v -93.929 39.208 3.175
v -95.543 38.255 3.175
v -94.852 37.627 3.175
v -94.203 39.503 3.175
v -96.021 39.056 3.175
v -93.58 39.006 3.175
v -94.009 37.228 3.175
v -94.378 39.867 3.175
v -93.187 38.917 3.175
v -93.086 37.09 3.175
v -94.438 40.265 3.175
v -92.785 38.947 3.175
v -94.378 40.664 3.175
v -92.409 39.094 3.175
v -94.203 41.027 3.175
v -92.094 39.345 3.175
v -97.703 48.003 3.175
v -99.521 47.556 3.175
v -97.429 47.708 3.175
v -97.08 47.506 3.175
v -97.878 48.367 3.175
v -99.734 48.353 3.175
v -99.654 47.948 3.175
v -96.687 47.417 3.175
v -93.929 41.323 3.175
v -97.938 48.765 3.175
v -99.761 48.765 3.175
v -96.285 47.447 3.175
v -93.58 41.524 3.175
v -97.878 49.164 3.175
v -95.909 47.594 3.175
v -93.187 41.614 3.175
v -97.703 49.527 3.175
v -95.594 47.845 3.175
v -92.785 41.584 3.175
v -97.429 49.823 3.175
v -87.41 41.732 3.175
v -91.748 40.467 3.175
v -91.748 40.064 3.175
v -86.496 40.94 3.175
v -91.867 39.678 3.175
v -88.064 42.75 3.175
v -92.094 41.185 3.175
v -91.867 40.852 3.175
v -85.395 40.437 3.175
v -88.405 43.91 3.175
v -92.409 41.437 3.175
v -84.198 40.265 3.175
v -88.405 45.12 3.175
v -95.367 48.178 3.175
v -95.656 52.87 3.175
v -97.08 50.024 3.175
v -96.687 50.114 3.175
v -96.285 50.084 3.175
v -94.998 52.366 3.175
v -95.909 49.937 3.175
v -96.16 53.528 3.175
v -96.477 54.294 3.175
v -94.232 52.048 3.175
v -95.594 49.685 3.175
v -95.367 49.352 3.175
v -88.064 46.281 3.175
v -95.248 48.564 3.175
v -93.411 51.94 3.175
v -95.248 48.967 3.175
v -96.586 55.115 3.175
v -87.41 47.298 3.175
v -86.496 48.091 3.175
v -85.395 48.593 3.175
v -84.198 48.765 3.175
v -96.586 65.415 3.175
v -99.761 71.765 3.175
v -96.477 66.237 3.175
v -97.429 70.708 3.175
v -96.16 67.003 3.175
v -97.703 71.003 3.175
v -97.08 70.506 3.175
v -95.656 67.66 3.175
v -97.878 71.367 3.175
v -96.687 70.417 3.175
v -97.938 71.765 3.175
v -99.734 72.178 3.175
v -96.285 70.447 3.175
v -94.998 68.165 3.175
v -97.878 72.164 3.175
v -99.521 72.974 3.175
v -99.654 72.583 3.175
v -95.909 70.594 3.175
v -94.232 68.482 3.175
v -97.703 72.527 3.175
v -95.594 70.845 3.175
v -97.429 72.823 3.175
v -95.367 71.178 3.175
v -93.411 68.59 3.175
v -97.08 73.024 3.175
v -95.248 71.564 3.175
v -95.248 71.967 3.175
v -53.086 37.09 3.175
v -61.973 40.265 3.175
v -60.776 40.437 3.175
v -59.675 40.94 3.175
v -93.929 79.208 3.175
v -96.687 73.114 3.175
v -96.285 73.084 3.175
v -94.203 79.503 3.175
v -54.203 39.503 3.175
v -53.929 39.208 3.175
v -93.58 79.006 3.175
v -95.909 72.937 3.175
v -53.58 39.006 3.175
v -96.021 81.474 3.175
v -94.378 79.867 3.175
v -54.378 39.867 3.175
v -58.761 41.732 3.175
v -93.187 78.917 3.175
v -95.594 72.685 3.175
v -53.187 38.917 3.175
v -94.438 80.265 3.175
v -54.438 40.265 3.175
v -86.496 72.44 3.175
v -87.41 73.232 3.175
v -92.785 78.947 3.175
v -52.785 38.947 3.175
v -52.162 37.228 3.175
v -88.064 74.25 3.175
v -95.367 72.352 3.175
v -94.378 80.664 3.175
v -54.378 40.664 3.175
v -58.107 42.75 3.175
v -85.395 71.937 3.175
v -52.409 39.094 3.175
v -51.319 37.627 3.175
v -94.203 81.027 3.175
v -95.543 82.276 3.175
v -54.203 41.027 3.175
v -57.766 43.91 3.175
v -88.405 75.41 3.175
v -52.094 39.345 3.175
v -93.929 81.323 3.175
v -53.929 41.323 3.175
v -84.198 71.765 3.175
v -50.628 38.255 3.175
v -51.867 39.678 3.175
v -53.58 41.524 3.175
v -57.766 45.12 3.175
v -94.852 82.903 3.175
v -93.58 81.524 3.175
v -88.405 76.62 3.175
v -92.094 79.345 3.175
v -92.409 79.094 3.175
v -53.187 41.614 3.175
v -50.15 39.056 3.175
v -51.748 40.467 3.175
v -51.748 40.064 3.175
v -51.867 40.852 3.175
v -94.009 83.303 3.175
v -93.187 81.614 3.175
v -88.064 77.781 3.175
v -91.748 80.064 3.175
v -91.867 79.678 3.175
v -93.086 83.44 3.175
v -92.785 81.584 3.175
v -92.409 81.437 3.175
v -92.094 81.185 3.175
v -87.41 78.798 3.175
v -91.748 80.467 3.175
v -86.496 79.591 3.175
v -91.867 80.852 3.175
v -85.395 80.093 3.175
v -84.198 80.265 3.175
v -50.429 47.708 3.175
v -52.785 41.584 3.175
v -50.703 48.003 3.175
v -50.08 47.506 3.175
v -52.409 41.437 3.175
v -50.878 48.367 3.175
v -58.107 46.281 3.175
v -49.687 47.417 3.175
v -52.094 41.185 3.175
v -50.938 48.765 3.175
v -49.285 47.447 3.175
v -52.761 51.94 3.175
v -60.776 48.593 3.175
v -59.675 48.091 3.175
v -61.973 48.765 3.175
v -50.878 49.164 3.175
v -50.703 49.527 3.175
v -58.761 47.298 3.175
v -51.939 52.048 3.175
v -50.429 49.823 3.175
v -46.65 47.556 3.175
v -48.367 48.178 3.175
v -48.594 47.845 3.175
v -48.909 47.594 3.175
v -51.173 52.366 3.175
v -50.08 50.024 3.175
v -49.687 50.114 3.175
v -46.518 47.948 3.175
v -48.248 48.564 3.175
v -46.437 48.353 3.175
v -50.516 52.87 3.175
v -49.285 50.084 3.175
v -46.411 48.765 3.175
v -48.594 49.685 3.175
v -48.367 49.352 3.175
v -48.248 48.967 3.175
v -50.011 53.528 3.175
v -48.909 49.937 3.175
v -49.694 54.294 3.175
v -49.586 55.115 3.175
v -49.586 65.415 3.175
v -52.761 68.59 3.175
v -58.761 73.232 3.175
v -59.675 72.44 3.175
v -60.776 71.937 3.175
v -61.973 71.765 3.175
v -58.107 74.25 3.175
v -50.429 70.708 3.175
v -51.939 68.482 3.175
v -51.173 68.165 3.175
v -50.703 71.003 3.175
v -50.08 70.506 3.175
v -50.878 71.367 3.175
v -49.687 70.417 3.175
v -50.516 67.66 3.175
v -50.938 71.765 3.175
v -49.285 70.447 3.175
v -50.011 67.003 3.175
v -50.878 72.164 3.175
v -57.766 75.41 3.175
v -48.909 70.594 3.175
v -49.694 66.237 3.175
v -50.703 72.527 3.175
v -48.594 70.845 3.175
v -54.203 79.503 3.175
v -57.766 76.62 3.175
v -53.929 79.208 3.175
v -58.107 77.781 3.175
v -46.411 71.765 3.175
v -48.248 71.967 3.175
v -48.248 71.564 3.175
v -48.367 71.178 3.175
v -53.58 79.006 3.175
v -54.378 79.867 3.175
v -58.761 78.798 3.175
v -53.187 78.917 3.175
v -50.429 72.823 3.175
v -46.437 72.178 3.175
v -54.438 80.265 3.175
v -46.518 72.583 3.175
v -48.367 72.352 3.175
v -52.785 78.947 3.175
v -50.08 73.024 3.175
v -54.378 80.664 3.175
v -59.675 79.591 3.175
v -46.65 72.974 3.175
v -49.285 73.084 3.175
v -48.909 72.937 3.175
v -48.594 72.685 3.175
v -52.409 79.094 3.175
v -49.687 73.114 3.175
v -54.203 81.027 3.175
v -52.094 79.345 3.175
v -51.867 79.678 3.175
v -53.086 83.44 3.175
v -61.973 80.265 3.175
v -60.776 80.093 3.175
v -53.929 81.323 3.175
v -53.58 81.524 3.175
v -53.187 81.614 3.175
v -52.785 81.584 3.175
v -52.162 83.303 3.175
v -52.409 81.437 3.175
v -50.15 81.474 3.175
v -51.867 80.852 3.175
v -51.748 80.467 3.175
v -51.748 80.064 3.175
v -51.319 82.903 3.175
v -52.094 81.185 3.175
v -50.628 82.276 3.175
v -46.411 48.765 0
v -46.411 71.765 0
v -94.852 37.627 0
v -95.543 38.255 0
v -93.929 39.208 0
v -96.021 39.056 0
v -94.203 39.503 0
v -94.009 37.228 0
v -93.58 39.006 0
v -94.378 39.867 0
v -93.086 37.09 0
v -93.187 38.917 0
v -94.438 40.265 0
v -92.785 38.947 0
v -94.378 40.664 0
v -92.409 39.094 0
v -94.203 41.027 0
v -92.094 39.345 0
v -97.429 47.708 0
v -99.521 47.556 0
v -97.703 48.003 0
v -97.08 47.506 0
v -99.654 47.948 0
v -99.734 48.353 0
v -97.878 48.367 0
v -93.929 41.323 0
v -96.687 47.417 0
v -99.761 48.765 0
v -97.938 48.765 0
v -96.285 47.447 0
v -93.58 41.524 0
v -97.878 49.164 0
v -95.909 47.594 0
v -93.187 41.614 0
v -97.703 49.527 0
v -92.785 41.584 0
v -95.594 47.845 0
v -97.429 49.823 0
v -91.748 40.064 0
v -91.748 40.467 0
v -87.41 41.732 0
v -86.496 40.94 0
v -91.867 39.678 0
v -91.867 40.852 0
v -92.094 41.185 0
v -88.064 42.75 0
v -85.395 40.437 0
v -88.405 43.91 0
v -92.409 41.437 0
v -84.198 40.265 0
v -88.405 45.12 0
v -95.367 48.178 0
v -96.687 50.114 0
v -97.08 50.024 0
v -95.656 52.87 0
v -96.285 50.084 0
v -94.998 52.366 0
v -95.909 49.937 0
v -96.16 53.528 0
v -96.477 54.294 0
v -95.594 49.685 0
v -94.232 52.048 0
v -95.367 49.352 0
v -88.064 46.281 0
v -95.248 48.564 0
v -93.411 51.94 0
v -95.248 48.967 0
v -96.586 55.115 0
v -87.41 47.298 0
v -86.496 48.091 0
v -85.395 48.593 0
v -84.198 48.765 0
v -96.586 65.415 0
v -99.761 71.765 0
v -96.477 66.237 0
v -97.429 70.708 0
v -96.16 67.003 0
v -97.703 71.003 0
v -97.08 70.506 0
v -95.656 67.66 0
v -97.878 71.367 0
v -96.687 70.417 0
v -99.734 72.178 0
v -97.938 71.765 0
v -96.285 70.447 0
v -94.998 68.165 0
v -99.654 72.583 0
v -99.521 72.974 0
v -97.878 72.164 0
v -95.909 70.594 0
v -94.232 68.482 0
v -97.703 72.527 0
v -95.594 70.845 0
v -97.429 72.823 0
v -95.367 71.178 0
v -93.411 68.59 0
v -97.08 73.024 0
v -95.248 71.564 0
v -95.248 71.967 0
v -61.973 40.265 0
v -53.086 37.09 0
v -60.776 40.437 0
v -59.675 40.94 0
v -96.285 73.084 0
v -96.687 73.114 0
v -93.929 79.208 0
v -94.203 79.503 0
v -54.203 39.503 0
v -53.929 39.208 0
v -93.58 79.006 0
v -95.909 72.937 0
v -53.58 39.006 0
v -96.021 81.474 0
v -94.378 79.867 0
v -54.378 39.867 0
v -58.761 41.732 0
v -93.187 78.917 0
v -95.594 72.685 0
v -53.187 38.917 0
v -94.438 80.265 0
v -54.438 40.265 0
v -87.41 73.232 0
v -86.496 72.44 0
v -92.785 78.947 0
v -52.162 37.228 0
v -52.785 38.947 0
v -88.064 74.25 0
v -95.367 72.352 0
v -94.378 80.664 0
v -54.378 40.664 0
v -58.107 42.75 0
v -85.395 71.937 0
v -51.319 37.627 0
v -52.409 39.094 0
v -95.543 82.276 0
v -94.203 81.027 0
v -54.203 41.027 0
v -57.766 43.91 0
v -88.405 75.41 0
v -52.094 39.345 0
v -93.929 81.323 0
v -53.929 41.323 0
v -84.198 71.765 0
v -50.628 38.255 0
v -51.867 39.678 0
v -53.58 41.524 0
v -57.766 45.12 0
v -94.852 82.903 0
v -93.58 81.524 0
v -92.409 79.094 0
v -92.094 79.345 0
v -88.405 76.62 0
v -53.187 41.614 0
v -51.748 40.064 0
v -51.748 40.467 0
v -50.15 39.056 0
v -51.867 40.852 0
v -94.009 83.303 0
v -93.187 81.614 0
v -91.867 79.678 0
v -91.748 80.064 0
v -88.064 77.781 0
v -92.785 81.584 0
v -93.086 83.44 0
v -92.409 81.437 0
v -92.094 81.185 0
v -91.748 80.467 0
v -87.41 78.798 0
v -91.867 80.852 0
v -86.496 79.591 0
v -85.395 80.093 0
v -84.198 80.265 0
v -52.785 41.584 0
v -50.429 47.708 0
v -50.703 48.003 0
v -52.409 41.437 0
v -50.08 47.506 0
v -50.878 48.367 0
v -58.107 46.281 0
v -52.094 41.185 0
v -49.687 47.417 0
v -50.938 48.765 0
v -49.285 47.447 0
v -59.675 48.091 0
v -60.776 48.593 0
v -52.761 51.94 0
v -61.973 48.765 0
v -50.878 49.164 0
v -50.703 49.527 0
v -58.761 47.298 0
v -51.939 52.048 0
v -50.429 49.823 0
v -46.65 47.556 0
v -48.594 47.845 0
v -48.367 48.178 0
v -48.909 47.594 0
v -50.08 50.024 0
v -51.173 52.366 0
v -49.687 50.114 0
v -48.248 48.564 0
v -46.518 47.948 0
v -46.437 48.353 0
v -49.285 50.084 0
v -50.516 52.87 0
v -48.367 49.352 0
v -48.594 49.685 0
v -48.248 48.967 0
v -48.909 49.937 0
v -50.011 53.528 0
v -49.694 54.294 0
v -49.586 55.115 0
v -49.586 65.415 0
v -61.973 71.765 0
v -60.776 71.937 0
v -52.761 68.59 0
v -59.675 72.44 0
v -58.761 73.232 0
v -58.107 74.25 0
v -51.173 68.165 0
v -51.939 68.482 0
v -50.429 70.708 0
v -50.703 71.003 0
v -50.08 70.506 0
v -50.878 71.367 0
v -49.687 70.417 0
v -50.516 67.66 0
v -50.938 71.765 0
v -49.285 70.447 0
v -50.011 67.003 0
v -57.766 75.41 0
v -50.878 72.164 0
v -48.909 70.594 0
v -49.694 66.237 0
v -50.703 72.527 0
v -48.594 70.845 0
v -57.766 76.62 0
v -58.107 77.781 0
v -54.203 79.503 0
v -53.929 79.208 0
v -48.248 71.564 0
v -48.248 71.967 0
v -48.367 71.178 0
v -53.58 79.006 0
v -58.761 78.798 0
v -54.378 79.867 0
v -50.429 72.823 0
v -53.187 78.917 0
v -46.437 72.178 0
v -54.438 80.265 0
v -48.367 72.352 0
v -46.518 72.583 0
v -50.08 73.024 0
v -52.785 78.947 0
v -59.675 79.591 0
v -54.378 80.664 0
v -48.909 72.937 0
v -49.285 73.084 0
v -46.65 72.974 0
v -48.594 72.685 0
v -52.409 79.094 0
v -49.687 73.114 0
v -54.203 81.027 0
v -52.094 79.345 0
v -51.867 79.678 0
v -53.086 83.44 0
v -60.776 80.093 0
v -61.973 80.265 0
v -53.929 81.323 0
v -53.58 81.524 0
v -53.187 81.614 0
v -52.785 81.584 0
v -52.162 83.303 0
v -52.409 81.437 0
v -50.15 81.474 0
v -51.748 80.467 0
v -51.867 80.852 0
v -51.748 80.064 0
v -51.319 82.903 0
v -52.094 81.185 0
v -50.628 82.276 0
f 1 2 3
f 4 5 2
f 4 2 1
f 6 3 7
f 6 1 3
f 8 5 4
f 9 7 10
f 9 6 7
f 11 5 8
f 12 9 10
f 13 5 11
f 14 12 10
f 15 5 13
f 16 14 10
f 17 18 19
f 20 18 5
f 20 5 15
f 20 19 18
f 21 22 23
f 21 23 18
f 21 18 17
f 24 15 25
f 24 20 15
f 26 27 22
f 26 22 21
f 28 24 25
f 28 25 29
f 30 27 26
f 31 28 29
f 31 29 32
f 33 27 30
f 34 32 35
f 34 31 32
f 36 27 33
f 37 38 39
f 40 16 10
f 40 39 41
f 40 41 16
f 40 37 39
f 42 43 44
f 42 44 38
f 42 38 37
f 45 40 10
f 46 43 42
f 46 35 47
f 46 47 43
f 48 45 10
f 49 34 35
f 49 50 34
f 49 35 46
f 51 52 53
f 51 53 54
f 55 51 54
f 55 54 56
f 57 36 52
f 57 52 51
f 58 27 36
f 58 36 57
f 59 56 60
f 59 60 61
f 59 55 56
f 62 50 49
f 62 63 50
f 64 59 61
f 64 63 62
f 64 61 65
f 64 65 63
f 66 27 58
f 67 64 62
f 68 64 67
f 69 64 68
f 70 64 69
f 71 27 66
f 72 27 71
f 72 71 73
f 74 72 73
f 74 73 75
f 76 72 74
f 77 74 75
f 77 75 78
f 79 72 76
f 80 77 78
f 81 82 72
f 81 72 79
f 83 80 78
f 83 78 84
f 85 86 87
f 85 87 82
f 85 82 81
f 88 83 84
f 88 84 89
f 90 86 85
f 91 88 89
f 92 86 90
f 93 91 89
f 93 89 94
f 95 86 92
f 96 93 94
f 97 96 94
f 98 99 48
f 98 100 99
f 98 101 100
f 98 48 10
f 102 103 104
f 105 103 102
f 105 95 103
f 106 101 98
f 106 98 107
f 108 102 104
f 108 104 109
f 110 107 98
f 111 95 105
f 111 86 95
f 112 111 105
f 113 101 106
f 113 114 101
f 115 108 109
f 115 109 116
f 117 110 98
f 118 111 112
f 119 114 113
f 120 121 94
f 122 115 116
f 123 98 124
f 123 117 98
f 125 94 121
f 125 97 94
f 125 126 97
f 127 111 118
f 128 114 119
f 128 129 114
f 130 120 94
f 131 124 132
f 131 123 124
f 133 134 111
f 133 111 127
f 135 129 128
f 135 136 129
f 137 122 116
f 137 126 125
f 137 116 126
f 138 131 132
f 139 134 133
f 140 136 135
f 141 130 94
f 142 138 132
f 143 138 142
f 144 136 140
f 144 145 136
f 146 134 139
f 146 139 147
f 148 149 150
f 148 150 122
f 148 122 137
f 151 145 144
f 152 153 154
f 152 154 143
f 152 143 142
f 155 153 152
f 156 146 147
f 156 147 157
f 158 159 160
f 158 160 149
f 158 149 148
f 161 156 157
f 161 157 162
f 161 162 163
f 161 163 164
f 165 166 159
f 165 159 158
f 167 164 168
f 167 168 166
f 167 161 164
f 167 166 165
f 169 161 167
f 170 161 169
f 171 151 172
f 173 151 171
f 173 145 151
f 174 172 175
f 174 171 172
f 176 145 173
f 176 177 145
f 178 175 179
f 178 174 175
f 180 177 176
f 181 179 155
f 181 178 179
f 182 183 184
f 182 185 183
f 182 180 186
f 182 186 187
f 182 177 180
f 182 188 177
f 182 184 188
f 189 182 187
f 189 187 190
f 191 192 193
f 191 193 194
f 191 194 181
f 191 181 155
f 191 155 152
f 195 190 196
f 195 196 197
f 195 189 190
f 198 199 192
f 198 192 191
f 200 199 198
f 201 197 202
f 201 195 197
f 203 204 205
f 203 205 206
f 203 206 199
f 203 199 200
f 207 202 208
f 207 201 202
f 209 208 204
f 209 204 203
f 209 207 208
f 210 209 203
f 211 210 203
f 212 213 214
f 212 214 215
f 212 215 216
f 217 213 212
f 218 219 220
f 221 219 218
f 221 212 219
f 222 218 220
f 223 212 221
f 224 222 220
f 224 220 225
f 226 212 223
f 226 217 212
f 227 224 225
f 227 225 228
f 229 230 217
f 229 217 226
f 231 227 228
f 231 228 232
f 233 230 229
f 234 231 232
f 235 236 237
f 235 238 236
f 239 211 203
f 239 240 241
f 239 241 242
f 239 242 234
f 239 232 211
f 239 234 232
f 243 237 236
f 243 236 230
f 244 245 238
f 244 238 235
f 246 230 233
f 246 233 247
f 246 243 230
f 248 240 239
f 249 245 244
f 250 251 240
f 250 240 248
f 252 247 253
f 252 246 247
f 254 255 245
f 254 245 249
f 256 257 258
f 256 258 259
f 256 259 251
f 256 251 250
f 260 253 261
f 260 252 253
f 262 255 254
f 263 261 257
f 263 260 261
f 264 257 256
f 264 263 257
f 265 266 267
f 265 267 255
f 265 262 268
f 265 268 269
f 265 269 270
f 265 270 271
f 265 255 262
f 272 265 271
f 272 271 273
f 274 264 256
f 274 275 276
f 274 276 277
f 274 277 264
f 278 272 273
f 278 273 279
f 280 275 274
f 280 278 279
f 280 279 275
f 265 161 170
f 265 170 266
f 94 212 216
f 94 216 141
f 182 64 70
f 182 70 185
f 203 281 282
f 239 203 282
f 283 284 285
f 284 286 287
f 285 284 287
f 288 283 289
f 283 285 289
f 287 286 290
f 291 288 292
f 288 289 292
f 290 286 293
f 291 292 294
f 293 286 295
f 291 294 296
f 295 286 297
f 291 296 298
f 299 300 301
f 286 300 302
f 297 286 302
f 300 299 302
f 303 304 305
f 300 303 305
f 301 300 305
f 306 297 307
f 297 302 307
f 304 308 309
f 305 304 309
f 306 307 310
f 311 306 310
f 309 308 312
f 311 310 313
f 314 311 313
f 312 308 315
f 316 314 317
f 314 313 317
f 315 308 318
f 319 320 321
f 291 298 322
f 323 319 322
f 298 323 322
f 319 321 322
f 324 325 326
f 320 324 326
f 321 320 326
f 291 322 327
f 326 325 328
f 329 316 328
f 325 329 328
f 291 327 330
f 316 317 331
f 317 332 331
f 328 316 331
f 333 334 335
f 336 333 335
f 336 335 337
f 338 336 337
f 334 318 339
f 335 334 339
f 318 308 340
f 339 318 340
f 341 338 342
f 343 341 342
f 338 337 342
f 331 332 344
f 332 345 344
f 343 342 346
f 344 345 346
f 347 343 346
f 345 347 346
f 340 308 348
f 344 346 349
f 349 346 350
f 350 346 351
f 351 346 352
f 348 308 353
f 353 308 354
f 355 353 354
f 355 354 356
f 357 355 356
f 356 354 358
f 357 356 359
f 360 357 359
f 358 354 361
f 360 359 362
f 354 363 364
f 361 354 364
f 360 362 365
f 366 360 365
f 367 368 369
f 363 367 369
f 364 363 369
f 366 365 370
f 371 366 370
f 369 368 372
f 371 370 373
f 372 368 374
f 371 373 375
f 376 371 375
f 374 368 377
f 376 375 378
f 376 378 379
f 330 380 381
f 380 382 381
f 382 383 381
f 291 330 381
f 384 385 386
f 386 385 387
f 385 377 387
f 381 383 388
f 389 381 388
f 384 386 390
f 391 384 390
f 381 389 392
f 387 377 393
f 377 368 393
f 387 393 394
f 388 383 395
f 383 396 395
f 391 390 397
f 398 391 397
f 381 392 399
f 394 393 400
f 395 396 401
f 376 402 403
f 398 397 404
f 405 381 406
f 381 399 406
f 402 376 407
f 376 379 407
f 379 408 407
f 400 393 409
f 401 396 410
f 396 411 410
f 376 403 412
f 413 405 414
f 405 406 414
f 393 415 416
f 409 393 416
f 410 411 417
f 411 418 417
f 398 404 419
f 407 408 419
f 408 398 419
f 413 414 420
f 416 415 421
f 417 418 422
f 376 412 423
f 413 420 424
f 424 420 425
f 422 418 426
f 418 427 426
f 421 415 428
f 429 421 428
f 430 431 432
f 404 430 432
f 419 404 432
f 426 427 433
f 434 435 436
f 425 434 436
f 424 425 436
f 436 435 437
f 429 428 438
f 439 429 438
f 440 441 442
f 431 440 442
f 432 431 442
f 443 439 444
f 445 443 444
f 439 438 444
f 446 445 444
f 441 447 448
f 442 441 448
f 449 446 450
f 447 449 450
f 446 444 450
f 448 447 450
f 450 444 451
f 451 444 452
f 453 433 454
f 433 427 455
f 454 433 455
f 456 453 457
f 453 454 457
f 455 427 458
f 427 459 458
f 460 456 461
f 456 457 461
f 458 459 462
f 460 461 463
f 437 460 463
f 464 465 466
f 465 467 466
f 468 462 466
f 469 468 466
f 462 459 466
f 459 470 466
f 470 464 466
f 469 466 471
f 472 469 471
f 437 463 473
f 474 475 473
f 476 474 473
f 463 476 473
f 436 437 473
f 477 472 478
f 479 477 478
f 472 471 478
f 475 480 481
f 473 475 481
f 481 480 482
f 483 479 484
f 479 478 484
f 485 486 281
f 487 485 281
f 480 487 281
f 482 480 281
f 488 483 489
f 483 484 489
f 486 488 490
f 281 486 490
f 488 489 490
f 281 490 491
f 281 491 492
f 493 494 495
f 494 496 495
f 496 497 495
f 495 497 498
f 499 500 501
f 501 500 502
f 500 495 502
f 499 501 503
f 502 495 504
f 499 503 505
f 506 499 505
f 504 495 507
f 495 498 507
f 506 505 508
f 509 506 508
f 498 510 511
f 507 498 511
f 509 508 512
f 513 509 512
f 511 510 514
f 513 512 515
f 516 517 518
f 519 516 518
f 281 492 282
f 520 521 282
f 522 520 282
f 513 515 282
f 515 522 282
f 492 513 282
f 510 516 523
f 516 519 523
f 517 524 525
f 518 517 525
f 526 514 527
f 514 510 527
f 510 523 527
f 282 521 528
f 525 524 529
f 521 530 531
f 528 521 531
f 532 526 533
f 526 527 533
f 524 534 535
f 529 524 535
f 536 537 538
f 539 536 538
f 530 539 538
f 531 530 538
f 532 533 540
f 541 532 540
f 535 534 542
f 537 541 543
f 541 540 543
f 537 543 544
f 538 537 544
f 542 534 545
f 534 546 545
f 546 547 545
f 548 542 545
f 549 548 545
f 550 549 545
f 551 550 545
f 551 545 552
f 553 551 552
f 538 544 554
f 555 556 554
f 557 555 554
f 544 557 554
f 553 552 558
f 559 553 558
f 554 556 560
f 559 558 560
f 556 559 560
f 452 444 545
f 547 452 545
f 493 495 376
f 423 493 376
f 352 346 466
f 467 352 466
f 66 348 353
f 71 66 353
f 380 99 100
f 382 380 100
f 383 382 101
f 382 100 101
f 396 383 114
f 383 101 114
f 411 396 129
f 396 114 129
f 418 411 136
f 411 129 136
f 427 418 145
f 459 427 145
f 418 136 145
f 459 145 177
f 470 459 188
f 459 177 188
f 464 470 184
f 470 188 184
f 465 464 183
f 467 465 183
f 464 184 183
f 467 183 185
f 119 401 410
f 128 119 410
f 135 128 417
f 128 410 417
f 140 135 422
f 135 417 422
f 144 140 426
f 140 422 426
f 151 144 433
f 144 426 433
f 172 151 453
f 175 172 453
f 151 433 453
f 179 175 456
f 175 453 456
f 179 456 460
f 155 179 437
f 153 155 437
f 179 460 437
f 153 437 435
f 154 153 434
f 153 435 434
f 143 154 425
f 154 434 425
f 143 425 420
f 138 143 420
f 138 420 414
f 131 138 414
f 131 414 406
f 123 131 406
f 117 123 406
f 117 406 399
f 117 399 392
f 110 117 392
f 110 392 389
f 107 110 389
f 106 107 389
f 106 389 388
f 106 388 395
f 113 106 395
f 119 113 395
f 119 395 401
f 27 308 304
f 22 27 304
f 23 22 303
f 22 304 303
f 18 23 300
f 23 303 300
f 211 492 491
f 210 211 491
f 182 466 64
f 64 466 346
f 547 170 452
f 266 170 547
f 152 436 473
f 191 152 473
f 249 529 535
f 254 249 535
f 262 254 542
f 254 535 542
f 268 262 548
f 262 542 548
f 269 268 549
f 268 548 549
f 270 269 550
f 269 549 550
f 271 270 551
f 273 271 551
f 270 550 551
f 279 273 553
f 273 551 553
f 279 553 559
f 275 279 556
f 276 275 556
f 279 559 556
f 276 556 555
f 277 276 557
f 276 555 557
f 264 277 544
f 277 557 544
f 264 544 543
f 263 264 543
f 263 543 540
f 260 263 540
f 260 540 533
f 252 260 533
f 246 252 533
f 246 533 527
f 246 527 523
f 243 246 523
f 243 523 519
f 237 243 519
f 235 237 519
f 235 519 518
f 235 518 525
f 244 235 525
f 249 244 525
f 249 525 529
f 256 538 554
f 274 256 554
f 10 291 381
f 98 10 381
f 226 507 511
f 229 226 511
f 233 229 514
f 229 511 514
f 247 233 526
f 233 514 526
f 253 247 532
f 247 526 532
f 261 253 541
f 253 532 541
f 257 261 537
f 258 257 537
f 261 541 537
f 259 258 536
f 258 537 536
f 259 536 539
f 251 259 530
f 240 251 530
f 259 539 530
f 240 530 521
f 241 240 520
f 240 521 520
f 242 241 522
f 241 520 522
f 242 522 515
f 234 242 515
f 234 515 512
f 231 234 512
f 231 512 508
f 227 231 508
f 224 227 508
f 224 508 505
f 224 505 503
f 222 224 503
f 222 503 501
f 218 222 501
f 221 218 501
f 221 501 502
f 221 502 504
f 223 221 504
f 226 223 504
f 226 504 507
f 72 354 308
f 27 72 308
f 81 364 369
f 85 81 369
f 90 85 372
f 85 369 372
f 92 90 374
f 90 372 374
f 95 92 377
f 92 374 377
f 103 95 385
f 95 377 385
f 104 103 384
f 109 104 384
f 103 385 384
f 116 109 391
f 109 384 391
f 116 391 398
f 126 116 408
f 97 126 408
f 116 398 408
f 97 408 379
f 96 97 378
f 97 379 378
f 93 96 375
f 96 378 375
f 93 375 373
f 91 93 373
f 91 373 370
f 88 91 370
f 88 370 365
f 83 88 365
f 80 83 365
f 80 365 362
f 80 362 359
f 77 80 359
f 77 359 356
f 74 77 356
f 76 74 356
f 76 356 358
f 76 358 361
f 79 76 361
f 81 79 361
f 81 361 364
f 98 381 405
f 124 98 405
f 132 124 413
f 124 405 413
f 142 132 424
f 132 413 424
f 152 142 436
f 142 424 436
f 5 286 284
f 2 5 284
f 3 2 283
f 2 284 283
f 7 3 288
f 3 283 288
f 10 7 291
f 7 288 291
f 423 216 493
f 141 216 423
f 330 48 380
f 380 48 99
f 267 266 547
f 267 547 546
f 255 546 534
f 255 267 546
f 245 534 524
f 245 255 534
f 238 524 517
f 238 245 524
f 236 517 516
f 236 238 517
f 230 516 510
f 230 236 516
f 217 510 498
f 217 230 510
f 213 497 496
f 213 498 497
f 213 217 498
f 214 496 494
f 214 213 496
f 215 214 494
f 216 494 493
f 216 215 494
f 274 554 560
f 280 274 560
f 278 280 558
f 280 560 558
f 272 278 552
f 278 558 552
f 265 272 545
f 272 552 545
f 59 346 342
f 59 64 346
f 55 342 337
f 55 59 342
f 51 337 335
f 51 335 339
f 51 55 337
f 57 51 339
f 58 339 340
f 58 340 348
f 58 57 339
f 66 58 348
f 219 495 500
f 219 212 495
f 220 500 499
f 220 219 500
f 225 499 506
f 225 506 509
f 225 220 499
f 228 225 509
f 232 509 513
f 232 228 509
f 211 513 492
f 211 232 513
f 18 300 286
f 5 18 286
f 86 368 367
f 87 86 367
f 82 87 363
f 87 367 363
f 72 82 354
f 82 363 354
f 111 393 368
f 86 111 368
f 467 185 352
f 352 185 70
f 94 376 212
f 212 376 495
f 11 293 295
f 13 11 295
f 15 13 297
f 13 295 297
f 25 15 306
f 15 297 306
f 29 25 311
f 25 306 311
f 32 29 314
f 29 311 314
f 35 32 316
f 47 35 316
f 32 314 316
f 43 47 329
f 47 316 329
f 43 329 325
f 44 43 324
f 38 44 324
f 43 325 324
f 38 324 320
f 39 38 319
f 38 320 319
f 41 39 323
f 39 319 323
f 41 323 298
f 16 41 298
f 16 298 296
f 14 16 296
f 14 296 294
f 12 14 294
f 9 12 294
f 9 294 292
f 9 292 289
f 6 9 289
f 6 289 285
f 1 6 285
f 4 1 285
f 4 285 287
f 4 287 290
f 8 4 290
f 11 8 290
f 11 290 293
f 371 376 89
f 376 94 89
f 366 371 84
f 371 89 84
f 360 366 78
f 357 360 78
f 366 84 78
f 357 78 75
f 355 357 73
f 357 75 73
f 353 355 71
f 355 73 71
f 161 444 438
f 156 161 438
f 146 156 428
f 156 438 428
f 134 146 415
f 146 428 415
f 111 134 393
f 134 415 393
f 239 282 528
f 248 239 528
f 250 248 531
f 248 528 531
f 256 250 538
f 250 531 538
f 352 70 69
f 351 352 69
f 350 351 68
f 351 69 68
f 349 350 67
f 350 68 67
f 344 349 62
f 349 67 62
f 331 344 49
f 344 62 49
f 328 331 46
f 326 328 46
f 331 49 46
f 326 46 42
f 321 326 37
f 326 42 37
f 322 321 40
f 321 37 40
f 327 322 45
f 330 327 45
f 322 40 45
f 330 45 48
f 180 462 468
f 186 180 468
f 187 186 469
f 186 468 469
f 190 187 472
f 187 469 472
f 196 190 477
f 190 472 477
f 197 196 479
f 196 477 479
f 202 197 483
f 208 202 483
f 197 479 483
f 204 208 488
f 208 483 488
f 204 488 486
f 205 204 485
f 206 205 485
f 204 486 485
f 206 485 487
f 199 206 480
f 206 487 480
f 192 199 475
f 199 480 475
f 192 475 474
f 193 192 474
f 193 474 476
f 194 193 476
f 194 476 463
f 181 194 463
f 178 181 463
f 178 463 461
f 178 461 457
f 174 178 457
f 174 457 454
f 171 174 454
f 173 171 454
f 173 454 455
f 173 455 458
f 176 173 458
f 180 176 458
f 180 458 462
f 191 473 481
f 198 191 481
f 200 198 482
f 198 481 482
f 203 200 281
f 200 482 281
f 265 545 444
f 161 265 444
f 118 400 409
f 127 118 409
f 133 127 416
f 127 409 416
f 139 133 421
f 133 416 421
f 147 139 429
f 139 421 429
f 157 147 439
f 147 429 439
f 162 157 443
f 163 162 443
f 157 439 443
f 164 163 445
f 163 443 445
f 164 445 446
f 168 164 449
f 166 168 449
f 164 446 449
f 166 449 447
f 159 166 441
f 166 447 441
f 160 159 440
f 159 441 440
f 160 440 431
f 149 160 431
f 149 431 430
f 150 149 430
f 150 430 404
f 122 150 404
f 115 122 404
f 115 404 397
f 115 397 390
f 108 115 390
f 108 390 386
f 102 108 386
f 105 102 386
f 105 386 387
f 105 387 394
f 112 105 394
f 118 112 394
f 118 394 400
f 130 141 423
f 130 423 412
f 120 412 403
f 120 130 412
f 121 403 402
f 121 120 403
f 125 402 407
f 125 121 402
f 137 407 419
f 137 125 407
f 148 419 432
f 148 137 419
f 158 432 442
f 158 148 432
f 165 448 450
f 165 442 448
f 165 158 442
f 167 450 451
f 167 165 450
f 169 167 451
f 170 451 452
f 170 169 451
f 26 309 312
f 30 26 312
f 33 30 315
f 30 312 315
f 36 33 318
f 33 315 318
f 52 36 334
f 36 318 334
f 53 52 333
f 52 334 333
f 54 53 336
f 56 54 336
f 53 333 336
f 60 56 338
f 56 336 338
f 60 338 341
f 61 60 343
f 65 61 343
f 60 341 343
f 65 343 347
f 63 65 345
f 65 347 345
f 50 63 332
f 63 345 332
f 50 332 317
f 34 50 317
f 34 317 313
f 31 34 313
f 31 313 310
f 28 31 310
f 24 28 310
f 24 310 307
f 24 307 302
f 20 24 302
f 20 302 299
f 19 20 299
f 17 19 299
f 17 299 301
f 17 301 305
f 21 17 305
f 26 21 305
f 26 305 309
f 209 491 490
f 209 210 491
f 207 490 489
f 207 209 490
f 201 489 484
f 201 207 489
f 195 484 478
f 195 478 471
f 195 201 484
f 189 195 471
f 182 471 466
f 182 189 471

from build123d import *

# Parameters (mm, degrees)
SKETCH1_R             = 3.175
BOSS_EXTRUDE1_DEPTH   = 3.175
FILLET1_R             = 3.175
F_2_CLEARANCE_HOLE1_D = 2.7051
F_2_CLEARANCE_HOLE2_D = 2.7051
CUT_EXTRUDE1_DEPTH    = 131.094336971


with BuildPart() as part:
    # Sketch1 → Boss-Extrude1 (new body)
    with BuildSketch(Plane.XY):
        with BuildLine():
            ThreePointArc((-89.910569383, 80.265306107), (-93.701723521, 77.150666629), (-96.021422346, 81.474186739))
            Line((-96.021422346, 81.474186739), (-99.521422346, 72.974186739))
            ThreePointArc((-99.521422346, 72.974186739), (-95.969415245, 74.879945585), (-93.410569383, 71.765306107))
            ThreePointArc((-93.410569383, 71.765306107), (-94.340505353, 69.520242077), (-96.585569383, 68.590306107))
            Line((-96.585569383, 68.590306107), (-49.585569383, 68.590306107))
            ThreePointArc((-49.585569383, 68.590306107), (-52.223638848, 73.532002034), (-46.649716421, 72.974186739))
            Line((-46.649716421, 72.974186739), (-50.149716421, 81.474186739))
            ThreePointArc((-50.149716421, 81.474186739), (-49.970929905, 80.881460245), (-49.910569383, 80.265306107))
            ThreePointArc((-49.910569383, 80.265306107), (-55.330633414, 78.020242077), (-53.085569383, 83.440306107))
            Line((-53.085569383, 83.440306107), (-93.085569383, 83.440306107))
            ThreePointArc((-93.085569383, 83.440306107), (-90.840505353, 82.510370138), (-89.910569383, 80.265306107))
        make_face()
        with Locations((-93.085569383, 80.265306107)):
            Circle(SKETCH1_R)
        with Locations((-96.585569383, 71.765306107)):
            Circle(SKETCH1_R)
        with Locations((-49.585569383, 71.765306107)):
            Circle(SKETCH1_R)
        with Locations((-53.085569383, 80.265306107)):
            Circle(SKETCH1_R)
        with BuildLine():
            ThreePointArc((-46.410569383, 71.765306107), (-47.340505353, 69.520242077), (-49.585569383, 68.590306107))
            Line((-49.585569383, 68.590306107), (-49.585569383, 51.940306107))
            ThreePointArc((-49.585569383, 51.940306107), (-47.340505353, 51.010370138), (-46.410569383, 48.765306107))
            Line((-46.410569383, 48.765306107), (-46.410569383, 71.765306107))
        make_face()
        with Locations((-49.585569383, 48.765306107)):
            Circle(SKETCH1_R)
        with Locations((-53.085569383, 40.265306107)):
            Circle(SKETCH1_R)
        with BuildLine():
            Line((-49.585569383, 51.940306107), (-96.585569383, 51.940306107))
            ThreePointArc((-96.585569383, 51.940306107), (-94.340505353, 51.010370138), (-93.410569383, 48.765306107))
            ThreePointArc((-93.410569383, 48.765306107), (-95.969415245, 45.650666629), (-99.521422346, 47.556425476))
            Line((-99.521422346, 47.556425476), (-96.021422346, 39.056425476))
            ThreePointArc((-96.021422346, 39.056425476), (-93.701723521, 43.379945585), (-89.910569383, 40.265306107))
            ThreePointArc((-89.910569383, 40.265306107), (-90.840505353, 38.020242077), (-93.085569383, 37.090306107))
            Line((-93.085569383, 37.090306107), (-53.085569383, 37.090306107))
            ThreePointArc((-53.085569383, 37.090306107), (-55.330633414, 42.510370138), (-49.910569383, 40.265306107))
            ThreePointArc((-49.910569383, 40.265306107), (-49.970929905, 39.649151969), (-50.149716421, 39.056425476))
            Line((-50.149716421, 39.056425476), (-46.649716421, 47.556425476))
            ThreePointArc((-46.649716421, 47.556425476), (-52.223638848, 46.998610181), (-49.585569383, 51.940306107))
        make_face()
        with Locations((-93.085569383, 40.265306107)):
            Circle(SKETCH1_R)
        with Locations((-96.585569383, 48.765306107)):
            Circle(SKETCH1_R)
        with BuildLine():
            ThreePointArc((-96.585569383, 68.590306107), (-98.830633414, 69.520242077), (-99.760569383, 71.765306107))
            Line((-99.760569383, 71.765306107), (-99.760569383, 48.765306107))
            ThreePointArc((-99.760569383, 48.765306107), (-98.830633414, 51.010370138), (-96.585569383, 51.940306107))
            Line((-96.585569383, 51.940306107), (-96.585569383, 68.590306107))
        make_face()
    extrude(amount=BOSS_EXTRUDE1_DEPTH)

    # Fillet1
    fillet1_edges = [part.edges().sort_by_distance(p)[0] for p in [
        (-96.585569383, 68.590306107, 1.5875),
        (-96.585569383, 51.940306107, 1.5875),
        (-49.585569383, 51.940306107, 1.5875),
        (-49.585569383, 68.590306107, 1.5875),
    ]]
    fillet(fillet1_edges, radius=FILLET1_R)

    # #2 Clearance Hole1 (through all)
    with Locations(Plane.XY.offset(3.175)):
        with Locations((-93.085569383, 80.265306107), (-53.085569383, 80.265306107), (-53.085569383, 40.265306107), (-93.085569383, 40.265306107)):
            Hole(F_2_CLEARANCE_HOLE1_D / 2)

    # #2 Clearance Hole2 (through all)
    with Locations(Plane.XY.offset(3.175)):
        with Locations((-96.585569383, 71.765306107), (-49.585569383, 71.765306107), (-49.585569383, 48.765306107), (-96.585569383, 48.765306107)):
            Hole(F_2_CLEARANCE_HOLE2_D / 2)

    # Sketch6 → Cut-Extrude1 (cut, through all)
    with BuildSketch(Plane.XY.offset(3.175)):
        with BuildLine():
            Line((-84.198069383, 80.265306107), (-61.973069383, 80.265306107))
            ThreePointArc((-61.973069383, 80.265306107), (-57.723069383, 76.015306107), (-61.973069383, 71.765306107))
            Line((-61.973069383, 71.765306107), (-84.198069383, 71.765306107))
            ThreePointArc((-84.198069383, 71.765306107), (-88.448069383, 76.015306107), (-84.198069383, 80.265306107))
        make_face()
        with BuildLine():
            Line((-84.198069383, 40.265306107), (-61.973069383, 40.265306107))
            ThreePointArc((-61.973069383, 40.265306107), (-57.723069383, 44.515306107), (-61.973069383, 48.765306107))
            Line((-61.973069383, 48.765306107), (-84.198069383, 48.765306107))
            ThreePointArc((-84.198069383, 48.765306107), (-88.448069383, 44.515306107), (-84.198069383, 40.265306107))
        make_face()
    extrude(amount=-CUT_EXTRUDE1_DEPTH, mode=Mode.SUBTRACT)


solid = part.part
